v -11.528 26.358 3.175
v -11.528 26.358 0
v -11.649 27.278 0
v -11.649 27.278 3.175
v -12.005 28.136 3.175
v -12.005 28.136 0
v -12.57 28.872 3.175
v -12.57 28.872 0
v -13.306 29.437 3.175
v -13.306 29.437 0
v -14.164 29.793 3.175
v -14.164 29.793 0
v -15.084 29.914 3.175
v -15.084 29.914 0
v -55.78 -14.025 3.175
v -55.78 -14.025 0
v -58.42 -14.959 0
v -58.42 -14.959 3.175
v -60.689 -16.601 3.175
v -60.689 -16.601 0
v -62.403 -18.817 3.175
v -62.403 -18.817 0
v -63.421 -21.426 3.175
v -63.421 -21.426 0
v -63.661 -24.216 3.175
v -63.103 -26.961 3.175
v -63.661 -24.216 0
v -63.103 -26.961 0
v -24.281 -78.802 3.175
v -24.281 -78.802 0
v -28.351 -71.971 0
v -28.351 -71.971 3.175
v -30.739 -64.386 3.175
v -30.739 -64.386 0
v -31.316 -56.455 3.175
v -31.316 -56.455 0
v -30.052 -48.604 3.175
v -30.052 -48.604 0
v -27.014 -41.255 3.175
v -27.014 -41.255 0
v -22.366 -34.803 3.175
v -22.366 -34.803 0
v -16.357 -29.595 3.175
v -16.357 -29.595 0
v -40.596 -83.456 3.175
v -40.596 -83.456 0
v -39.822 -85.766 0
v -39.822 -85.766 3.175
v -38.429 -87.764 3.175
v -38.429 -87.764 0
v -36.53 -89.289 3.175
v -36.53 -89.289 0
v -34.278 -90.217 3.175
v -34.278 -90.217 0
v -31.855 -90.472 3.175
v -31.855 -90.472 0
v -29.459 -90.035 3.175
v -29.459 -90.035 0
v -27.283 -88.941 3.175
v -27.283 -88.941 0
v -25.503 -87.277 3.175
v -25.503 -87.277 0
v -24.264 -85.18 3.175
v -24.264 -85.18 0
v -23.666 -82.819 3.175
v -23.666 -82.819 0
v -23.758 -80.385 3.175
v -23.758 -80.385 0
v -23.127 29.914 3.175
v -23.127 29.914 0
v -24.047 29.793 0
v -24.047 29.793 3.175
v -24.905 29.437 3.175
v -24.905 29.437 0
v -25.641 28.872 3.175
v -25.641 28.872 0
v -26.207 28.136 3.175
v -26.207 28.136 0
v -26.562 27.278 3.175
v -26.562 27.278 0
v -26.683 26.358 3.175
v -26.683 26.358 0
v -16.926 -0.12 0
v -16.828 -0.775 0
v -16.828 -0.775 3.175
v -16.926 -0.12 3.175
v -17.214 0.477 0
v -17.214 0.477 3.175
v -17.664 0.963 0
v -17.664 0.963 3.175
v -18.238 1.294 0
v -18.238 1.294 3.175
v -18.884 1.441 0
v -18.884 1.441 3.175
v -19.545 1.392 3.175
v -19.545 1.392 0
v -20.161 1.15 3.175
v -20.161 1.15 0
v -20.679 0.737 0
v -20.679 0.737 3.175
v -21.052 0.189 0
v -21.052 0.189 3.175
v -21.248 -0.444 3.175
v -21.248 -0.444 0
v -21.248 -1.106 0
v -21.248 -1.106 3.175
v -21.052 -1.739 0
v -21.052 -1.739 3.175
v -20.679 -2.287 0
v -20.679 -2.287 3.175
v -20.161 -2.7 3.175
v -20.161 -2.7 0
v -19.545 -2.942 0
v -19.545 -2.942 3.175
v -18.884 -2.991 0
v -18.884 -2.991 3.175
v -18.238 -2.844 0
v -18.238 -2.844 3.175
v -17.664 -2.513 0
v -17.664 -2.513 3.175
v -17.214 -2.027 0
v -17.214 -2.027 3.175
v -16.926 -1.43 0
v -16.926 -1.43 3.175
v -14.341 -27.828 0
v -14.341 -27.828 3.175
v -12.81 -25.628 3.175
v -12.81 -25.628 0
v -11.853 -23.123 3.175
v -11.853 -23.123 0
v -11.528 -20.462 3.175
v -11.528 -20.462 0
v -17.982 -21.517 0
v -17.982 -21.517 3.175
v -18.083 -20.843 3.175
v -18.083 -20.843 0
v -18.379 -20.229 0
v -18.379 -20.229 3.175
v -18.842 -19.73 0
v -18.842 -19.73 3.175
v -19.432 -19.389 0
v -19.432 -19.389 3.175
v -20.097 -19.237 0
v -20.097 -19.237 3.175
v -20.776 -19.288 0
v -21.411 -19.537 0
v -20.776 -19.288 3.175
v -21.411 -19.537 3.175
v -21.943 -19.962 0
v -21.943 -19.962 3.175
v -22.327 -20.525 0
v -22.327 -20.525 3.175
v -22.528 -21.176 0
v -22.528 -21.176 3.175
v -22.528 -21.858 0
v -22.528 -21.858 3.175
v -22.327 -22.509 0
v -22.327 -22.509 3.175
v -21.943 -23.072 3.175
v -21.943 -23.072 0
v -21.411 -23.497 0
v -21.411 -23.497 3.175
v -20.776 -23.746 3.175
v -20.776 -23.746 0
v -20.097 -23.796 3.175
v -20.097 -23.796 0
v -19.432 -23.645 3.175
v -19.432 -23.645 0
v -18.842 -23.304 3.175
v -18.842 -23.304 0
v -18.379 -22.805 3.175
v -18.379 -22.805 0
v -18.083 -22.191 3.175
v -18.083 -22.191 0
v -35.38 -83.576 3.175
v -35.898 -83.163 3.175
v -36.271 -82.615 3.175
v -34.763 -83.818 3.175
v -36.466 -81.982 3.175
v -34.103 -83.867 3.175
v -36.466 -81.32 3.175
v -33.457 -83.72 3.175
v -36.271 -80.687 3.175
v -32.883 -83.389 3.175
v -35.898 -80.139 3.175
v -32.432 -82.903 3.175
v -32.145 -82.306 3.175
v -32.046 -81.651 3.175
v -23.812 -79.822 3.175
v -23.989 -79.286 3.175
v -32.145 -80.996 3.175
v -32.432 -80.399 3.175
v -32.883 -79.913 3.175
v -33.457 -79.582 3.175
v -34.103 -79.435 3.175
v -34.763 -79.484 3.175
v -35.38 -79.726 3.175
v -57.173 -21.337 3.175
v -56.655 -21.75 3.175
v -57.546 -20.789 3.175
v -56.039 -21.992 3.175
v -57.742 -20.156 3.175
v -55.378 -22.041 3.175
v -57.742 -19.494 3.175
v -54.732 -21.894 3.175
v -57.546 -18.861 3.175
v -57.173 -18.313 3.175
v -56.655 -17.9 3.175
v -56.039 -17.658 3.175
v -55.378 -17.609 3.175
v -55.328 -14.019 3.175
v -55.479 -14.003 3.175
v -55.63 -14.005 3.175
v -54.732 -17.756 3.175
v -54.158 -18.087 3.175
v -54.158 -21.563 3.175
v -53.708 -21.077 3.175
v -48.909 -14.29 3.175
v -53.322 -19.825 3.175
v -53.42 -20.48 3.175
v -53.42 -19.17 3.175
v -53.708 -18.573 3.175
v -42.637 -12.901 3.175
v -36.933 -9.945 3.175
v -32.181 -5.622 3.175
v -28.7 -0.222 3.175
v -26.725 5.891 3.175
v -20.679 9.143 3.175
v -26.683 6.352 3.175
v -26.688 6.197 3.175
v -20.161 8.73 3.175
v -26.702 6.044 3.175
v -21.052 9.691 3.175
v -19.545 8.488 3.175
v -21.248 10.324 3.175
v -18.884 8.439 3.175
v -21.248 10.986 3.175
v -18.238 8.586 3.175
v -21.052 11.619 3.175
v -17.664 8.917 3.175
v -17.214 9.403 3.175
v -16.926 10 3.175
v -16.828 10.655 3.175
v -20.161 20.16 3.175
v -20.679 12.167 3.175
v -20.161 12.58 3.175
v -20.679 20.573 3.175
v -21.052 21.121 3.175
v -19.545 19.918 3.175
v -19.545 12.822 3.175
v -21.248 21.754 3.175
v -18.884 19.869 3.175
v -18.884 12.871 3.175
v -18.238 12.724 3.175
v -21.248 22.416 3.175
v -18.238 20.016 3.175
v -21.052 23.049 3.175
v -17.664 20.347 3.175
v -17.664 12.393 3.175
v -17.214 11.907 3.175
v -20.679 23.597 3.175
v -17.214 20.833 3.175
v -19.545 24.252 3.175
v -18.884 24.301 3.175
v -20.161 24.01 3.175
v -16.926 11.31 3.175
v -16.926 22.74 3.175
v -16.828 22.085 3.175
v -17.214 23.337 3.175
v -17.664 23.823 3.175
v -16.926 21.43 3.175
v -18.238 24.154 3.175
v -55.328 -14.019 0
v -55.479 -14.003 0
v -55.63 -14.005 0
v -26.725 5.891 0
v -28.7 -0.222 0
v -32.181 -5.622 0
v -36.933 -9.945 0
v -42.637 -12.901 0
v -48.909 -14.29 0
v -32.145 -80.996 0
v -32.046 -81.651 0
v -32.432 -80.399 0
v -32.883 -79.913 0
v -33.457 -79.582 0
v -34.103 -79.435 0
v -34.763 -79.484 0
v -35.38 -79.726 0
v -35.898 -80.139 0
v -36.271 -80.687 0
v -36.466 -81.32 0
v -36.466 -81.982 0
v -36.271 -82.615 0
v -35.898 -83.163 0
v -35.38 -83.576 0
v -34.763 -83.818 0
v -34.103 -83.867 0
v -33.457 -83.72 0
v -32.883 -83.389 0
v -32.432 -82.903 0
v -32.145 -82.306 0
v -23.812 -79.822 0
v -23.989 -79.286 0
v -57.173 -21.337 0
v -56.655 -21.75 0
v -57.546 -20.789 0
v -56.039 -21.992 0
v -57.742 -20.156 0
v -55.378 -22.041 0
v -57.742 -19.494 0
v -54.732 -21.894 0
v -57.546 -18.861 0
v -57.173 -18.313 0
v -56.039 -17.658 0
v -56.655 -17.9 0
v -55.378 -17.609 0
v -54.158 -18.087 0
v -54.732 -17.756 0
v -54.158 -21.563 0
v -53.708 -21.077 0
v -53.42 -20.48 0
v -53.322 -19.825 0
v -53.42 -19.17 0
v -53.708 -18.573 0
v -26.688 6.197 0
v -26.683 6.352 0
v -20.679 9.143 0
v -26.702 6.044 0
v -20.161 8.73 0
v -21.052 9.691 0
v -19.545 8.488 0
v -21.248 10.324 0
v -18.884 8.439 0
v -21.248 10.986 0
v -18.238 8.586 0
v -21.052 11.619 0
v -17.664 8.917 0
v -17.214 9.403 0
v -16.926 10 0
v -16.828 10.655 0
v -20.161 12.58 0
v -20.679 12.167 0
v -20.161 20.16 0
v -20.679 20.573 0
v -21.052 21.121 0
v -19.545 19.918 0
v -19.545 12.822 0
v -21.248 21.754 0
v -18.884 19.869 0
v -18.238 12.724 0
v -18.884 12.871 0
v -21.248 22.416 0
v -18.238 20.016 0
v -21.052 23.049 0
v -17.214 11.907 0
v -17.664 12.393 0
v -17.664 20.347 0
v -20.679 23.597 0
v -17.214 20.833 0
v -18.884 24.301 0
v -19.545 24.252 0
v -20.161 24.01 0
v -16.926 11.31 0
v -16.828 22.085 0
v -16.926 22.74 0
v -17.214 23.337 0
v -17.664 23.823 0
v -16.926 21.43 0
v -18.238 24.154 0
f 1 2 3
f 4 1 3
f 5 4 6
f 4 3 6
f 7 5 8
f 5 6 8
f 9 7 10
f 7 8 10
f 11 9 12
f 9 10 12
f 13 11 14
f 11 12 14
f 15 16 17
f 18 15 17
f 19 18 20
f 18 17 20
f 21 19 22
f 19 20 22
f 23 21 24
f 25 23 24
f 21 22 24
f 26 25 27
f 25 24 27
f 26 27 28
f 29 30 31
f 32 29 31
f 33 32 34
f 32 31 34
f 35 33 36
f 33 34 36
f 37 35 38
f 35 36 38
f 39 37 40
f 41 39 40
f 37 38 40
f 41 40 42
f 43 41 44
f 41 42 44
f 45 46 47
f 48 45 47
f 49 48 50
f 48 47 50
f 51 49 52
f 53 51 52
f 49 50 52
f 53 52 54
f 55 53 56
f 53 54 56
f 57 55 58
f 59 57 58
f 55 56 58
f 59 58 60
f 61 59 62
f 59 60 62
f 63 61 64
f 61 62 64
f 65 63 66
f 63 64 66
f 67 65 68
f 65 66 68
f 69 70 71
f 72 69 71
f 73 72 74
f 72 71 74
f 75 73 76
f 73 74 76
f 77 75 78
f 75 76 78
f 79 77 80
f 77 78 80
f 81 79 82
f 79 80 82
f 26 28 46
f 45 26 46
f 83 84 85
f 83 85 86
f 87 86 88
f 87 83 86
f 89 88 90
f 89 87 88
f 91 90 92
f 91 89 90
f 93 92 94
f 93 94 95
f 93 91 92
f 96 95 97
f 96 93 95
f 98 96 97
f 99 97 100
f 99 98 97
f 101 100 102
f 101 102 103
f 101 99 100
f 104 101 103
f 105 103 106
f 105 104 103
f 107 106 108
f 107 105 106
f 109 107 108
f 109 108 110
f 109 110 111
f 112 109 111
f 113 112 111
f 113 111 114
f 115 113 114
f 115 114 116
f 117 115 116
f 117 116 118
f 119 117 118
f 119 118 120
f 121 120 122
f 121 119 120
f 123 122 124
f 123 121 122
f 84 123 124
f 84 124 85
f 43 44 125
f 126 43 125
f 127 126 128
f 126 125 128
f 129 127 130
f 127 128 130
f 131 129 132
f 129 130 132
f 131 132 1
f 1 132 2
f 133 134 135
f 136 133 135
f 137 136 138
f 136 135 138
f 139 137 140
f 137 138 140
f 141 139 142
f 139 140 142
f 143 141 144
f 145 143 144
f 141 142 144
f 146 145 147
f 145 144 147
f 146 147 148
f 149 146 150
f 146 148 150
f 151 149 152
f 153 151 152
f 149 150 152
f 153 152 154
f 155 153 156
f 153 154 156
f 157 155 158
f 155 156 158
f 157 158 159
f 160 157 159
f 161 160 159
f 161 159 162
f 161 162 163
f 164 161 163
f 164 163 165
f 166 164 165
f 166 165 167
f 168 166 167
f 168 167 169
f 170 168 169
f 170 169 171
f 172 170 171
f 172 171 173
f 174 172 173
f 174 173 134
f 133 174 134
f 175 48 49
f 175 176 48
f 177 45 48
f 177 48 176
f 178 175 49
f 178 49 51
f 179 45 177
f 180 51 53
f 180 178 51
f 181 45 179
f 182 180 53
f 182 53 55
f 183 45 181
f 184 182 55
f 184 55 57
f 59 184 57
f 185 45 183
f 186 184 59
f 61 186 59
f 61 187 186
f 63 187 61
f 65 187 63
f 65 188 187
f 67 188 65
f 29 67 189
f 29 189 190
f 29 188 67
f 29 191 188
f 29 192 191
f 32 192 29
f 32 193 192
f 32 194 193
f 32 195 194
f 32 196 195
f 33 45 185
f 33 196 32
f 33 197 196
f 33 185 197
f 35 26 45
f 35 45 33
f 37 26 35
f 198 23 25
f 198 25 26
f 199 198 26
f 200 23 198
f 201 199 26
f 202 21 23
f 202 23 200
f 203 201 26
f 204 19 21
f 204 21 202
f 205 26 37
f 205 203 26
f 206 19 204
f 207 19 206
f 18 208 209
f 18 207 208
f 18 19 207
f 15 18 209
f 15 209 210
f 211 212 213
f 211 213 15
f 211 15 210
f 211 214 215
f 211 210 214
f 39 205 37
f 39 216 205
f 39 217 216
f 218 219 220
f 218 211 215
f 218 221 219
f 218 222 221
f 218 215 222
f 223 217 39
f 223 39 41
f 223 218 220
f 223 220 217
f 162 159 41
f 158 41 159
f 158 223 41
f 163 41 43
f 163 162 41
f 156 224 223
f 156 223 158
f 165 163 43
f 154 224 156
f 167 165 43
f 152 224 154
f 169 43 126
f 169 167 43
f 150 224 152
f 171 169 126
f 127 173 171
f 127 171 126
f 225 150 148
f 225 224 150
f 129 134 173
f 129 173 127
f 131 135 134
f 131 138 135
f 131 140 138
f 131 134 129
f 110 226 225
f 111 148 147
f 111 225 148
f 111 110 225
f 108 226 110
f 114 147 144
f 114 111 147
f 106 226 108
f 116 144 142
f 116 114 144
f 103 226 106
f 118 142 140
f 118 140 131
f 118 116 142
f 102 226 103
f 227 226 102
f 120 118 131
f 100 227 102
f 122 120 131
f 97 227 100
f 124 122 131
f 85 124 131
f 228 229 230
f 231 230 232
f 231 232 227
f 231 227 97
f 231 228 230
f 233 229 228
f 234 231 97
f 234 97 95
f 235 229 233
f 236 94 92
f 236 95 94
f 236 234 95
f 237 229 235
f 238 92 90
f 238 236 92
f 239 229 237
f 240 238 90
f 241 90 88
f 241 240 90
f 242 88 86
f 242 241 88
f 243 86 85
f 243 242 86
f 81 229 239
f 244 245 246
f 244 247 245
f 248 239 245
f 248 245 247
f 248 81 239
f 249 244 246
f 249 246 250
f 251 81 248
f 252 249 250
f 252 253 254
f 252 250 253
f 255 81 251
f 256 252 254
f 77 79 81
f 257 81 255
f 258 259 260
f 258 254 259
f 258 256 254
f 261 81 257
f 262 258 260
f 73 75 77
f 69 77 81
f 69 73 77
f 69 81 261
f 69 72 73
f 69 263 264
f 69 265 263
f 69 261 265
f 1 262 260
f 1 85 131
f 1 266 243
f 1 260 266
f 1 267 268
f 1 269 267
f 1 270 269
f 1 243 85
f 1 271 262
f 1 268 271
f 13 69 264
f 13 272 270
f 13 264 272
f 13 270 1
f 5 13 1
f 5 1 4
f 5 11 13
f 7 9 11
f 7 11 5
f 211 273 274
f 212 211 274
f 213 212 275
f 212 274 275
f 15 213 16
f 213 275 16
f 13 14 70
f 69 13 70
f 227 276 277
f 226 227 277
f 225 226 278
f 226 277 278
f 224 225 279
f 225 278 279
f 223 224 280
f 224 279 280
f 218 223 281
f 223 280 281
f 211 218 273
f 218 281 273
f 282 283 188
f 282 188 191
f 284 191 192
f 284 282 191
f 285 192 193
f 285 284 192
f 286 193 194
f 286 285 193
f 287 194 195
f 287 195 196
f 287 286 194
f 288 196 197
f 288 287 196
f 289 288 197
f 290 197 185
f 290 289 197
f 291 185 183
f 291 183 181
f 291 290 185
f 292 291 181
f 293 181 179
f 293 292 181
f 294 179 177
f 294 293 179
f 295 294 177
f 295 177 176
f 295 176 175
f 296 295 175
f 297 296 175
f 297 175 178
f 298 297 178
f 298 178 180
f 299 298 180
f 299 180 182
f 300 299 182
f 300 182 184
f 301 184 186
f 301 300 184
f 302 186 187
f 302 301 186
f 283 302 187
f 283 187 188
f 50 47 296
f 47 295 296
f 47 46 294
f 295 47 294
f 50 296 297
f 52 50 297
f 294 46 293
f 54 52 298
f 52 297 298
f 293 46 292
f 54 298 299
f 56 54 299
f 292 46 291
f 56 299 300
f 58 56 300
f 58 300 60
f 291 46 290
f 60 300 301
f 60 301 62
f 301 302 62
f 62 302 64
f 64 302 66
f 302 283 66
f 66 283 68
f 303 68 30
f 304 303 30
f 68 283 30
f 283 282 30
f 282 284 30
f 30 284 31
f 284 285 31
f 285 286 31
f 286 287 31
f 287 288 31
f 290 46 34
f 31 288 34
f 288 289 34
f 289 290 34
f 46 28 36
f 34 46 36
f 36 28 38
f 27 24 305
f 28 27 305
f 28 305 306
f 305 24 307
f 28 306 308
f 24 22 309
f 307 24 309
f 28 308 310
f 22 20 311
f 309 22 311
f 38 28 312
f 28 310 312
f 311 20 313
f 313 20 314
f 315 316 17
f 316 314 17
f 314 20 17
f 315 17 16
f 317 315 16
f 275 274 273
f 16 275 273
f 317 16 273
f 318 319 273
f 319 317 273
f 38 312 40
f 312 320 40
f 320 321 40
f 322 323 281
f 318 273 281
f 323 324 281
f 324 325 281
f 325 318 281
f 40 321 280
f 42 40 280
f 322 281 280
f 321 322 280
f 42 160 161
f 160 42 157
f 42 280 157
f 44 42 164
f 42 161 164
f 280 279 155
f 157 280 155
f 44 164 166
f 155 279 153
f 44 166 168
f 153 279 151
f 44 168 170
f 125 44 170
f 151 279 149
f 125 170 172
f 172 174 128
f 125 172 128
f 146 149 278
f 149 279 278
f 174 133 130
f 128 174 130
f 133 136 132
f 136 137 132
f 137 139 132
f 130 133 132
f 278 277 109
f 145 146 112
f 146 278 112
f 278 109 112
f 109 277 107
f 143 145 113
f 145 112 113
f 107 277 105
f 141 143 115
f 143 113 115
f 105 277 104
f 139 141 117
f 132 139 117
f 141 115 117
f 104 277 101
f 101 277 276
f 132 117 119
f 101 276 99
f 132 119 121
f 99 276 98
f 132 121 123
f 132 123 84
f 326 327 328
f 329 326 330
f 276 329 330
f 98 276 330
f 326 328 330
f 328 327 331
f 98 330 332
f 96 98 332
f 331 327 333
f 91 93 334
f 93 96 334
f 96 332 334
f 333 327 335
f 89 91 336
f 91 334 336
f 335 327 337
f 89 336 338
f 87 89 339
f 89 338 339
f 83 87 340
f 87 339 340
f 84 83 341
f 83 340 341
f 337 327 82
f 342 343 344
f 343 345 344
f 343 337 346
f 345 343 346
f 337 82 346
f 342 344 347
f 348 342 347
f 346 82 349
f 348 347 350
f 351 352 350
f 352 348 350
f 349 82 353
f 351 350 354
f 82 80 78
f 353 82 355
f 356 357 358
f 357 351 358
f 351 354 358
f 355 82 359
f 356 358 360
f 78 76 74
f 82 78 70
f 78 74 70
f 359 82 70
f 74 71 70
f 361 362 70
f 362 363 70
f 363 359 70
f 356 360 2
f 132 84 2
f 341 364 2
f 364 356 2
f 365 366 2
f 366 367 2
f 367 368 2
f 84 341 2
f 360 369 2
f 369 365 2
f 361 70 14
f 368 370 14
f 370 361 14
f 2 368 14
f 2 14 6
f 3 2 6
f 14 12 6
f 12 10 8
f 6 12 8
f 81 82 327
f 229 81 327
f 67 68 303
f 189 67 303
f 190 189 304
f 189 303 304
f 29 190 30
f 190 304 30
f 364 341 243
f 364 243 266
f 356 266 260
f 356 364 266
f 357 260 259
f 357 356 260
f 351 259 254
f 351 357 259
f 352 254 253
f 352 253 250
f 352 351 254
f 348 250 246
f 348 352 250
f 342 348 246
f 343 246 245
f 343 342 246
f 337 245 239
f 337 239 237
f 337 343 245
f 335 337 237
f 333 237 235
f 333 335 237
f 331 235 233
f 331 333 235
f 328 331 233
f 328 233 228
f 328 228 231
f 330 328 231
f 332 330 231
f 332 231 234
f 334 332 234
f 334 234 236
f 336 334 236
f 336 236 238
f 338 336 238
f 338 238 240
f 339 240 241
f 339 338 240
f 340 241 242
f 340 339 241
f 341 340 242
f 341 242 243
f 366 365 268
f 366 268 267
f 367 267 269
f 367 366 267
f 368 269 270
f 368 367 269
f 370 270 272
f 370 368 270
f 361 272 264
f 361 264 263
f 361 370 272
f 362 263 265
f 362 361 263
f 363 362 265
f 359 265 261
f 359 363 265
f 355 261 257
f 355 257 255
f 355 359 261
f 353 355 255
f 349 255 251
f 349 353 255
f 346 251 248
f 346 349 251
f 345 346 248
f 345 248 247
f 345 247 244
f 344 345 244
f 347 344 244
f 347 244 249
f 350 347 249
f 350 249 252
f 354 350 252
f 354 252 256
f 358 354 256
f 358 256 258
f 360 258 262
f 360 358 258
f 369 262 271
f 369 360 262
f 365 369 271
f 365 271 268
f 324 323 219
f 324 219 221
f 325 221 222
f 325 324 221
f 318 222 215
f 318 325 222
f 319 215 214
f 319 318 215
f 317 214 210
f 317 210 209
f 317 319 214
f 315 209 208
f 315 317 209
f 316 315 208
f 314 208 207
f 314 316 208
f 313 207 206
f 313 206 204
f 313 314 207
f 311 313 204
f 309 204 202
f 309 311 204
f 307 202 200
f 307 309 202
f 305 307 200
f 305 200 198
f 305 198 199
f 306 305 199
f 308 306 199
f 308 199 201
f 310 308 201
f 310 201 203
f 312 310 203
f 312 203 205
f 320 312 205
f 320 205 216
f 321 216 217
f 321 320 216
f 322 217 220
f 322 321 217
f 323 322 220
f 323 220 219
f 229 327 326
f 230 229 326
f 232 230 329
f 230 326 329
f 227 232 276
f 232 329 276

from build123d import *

# Parameters (mm, degrees)
SKETCH1_R           = 2.2225
BOSS_EXTRUDE1_DEPTH = 3.175
SKETCH2_R           = 2.286
CUT_EXTRUDE1_DEPTH  = 111.684893933


with BuildPart() as part:
    # Sketch1 → Boss-Extrude1 (new body)
    with BuildSketch(Plane.XY):
        with BuildLine():
            Line((-26.682968963, 26.357722587), (-26.682968963, 6.351785872))
            ThreePointArc((-26.682968963, 6.351785872), (-26.693527307, 6.120431356), (-26.725114563, 5.891000243))
            ThreePointArc((-26.725114563, 5.891000243), (-36.932915208, -9.945248539), (-55.328203965, -14.019474973))
            ThreePointArc((-55.328203965, -14.019474973), (-55.554473877, -14.001365453), (-55.780223055, -14.025100158))
            ThreePointArc((-55.780223055, -14.025100158), (-62.402560981, -18.816713415), (-63.103372405, -26.960654757))
            Line((-63.103372405, -26.960654757), (-40.595944625, -83.455943866))
            ThreePointArc((-40.595944625, -83.455943866), (-30.641352377, -90.339421853), (-23.75787439, -80.384829605))
            ThreePointArc((-23.75787439, -80.384829605), (-23.88583974, -79.549342433), (-24.280867854, -78.802103023))
            ThreePointArc((-24.280867854, -78.802103023), (-30.912062559, -52.492603109), (-16.357010265, -29.594721511))
            ThreePointArc((-16.357010265, -29.594721511), (-12.809669567, -25.627558214), (-11.528139151, -20.46231955))
            Line((-11.528139151, -20.46231955), (-11.528139151, 26.357722587))
            ThreePointArc((-11.528139151, 26.357722587), (-12.569667438, 28.872194301), (-15.084139151, 29.913722587))
            Line((-15.084139151, 29.913722587), (-23.126968963, 29.913722587))
            ThreePointArc((-23.126968963, 29.913722587), (-25.641440677, 28.872194301), (-26.682968963, 26.357722587))
        make_face()
        with Locations((-55.544078679, -19.824964902)):
            Circle(SKETCH1_R, mode=Mode.SUBTRACT)
        with Locations((-19.05, 22.084955235)):
            Circle(SKETCH1_R, mode=Mode.SUBTRACT)
        with Locations((-19.05, -0.775044765)):
            Circle(SKETCH1_R, mode=Mode.SUBTRACT)
        with Locations((-34.268702177, -81.651111456)):
            Circle(SKETCH1_R, mode=Mode.SUBTRACT)
        with Locations((-19.05, 10.654955235)):
            Circle(SKETCH1_R, mode=Mode.SUBTRACT)
    extrude(amount=BOSS_EXTRUDE1_DEPTH)

    # Sketch2 → Cut-Extrude1 (cut, through all)
    with BuildSketch(Plane.XY.offset(3.175)):
        with Locations((-20.267510202, -21.516890861)):
            Circle(SKETCH2_R)
    extrude(amount=-CUT_EXTRUDE1_DEPTH, mode=Mode.SUBTRACT)


solid = part.part
